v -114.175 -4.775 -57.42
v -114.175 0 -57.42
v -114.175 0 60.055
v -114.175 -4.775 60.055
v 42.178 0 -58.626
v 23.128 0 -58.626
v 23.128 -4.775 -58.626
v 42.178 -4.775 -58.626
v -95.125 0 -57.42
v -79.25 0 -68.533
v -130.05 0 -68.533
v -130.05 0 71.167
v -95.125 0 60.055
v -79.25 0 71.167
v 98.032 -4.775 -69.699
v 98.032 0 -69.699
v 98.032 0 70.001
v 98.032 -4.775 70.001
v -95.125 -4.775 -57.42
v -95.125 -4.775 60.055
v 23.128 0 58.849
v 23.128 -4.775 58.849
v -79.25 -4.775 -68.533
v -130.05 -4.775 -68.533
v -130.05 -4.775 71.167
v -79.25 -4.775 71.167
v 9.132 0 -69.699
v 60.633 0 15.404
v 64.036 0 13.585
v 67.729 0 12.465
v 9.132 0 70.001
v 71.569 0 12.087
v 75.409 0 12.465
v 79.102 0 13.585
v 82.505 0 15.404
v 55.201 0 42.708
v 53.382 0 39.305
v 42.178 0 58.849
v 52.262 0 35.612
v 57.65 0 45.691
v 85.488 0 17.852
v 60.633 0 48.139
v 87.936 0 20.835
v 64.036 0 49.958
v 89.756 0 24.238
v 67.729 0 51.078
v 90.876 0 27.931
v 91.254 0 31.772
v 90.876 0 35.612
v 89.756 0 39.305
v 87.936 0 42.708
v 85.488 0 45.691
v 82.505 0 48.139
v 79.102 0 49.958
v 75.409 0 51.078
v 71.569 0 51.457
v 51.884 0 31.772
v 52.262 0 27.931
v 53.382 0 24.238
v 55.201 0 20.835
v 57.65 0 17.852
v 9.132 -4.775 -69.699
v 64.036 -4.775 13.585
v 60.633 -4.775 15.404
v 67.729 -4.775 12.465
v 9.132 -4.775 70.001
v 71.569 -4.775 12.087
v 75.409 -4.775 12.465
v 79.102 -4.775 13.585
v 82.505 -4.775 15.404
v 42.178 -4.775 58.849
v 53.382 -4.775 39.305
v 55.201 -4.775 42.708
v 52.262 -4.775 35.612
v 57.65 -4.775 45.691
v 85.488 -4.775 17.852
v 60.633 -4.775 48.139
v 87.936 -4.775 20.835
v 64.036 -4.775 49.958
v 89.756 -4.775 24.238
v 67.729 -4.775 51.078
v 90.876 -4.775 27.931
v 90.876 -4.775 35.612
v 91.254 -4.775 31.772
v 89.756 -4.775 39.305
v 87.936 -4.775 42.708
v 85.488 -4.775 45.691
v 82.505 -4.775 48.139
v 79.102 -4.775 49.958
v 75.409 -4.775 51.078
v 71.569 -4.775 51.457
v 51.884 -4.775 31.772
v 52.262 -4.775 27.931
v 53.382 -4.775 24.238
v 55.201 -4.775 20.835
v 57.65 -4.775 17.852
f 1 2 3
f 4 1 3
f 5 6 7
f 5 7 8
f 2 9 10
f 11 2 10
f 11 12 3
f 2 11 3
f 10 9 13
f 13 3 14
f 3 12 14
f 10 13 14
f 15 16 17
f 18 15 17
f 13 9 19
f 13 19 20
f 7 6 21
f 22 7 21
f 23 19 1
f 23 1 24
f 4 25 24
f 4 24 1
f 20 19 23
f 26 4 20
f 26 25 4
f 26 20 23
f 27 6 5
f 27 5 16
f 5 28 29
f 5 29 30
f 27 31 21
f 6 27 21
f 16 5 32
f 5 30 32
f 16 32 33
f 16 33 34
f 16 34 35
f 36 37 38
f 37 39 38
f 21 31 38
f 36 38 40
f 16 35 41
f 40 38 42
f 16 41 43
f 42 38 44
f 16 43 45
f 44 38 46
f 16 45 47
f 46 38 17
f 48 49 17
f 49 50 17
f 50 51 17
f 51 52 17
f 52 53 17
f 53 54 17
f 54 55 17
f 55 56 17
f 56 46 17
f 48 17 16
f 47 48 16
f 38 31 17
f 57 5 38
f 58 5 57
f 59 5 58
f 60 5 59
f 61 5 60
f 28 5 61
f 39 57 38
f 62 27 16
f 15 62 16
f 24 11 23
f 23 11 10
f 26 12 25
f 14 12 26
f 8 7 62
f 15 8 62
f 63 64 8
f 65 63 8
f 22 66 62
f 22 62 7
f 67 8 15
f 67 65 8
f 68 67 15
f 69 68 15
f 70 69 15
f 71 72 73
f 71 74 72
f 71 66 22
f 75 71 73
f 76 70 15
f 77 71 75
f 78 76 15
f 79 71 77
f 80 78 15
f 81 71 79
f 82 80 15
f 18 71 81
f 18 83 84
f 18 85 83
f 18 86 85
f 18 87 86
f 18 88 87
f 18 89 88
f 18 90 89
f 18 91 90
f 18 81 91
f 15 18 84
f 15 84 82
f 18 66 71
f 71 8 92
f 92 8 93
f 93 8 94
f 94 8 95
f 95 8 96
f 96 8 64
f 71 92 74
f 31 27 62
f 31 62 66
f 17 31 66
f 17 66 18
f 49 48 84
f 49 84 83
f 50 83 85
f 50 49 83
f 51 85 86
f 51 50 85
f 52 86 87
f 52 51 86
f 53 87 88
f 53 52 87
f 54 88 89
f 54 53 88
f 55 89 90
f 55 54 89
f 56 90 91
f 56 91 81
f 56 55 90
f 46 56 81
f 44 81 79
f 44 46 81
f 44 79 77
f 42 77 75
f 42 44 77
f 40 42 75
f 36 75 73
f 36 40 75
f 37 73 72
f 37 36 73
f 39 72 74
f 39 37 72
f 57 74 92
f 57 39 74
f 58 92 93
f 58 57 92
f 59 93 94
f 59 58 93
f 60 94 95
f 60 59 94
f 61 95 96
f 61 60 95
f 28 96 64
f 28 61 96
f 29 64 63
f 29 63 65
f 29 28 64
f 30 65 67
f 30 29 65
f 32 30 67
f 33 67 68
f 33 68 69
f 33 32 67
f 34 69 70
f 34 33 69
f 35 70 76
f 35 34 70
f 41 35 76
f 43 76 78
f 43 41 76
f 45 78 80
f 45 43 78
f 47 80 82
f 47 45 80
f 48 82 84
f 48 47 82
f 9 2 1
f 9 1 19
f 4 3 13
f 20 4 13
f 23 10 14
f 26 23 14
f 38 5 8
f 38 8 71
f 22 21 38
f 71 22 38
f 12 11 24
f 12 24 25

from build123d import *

# Parameters (mm, degrees)
F0_W     = 50.8
F0_H     = 139.7
F0_W_2   = 19.05
F0_H_2   = 117.475
F0_W_3   = 88.9
F0_R     = 19.685
F1_DEPTH = 4.7752


with BuildPart() as f1:
    # F0 (on Front) → F1 (new body)
    with BuildSketch(Plane.XZ):
        with Locations((-104.650039, 1.317416)):
            Rectangle(F0_W, F0_H)
        with Locations((-104.650039, 1.317416)):
            Rectangle(F0_W_2, F0_H_2, mode=Mode.SUBTRACT)
        with Locations((53.581607, 0.151088)):
            Rectangle(F0_W_3, F0_H)
        with Locations((32.652528, 0.111114)):
            Rectangle(F0_W_2, F0_H_2, mode=Mode.SUBTRACT)
        with Locations((71.568966, 31.771505)):
            Circle(F0_R, mode=Mode.SUBTRACT)
    extrude(amount=F1_DEPTH)


solid = f1.part
